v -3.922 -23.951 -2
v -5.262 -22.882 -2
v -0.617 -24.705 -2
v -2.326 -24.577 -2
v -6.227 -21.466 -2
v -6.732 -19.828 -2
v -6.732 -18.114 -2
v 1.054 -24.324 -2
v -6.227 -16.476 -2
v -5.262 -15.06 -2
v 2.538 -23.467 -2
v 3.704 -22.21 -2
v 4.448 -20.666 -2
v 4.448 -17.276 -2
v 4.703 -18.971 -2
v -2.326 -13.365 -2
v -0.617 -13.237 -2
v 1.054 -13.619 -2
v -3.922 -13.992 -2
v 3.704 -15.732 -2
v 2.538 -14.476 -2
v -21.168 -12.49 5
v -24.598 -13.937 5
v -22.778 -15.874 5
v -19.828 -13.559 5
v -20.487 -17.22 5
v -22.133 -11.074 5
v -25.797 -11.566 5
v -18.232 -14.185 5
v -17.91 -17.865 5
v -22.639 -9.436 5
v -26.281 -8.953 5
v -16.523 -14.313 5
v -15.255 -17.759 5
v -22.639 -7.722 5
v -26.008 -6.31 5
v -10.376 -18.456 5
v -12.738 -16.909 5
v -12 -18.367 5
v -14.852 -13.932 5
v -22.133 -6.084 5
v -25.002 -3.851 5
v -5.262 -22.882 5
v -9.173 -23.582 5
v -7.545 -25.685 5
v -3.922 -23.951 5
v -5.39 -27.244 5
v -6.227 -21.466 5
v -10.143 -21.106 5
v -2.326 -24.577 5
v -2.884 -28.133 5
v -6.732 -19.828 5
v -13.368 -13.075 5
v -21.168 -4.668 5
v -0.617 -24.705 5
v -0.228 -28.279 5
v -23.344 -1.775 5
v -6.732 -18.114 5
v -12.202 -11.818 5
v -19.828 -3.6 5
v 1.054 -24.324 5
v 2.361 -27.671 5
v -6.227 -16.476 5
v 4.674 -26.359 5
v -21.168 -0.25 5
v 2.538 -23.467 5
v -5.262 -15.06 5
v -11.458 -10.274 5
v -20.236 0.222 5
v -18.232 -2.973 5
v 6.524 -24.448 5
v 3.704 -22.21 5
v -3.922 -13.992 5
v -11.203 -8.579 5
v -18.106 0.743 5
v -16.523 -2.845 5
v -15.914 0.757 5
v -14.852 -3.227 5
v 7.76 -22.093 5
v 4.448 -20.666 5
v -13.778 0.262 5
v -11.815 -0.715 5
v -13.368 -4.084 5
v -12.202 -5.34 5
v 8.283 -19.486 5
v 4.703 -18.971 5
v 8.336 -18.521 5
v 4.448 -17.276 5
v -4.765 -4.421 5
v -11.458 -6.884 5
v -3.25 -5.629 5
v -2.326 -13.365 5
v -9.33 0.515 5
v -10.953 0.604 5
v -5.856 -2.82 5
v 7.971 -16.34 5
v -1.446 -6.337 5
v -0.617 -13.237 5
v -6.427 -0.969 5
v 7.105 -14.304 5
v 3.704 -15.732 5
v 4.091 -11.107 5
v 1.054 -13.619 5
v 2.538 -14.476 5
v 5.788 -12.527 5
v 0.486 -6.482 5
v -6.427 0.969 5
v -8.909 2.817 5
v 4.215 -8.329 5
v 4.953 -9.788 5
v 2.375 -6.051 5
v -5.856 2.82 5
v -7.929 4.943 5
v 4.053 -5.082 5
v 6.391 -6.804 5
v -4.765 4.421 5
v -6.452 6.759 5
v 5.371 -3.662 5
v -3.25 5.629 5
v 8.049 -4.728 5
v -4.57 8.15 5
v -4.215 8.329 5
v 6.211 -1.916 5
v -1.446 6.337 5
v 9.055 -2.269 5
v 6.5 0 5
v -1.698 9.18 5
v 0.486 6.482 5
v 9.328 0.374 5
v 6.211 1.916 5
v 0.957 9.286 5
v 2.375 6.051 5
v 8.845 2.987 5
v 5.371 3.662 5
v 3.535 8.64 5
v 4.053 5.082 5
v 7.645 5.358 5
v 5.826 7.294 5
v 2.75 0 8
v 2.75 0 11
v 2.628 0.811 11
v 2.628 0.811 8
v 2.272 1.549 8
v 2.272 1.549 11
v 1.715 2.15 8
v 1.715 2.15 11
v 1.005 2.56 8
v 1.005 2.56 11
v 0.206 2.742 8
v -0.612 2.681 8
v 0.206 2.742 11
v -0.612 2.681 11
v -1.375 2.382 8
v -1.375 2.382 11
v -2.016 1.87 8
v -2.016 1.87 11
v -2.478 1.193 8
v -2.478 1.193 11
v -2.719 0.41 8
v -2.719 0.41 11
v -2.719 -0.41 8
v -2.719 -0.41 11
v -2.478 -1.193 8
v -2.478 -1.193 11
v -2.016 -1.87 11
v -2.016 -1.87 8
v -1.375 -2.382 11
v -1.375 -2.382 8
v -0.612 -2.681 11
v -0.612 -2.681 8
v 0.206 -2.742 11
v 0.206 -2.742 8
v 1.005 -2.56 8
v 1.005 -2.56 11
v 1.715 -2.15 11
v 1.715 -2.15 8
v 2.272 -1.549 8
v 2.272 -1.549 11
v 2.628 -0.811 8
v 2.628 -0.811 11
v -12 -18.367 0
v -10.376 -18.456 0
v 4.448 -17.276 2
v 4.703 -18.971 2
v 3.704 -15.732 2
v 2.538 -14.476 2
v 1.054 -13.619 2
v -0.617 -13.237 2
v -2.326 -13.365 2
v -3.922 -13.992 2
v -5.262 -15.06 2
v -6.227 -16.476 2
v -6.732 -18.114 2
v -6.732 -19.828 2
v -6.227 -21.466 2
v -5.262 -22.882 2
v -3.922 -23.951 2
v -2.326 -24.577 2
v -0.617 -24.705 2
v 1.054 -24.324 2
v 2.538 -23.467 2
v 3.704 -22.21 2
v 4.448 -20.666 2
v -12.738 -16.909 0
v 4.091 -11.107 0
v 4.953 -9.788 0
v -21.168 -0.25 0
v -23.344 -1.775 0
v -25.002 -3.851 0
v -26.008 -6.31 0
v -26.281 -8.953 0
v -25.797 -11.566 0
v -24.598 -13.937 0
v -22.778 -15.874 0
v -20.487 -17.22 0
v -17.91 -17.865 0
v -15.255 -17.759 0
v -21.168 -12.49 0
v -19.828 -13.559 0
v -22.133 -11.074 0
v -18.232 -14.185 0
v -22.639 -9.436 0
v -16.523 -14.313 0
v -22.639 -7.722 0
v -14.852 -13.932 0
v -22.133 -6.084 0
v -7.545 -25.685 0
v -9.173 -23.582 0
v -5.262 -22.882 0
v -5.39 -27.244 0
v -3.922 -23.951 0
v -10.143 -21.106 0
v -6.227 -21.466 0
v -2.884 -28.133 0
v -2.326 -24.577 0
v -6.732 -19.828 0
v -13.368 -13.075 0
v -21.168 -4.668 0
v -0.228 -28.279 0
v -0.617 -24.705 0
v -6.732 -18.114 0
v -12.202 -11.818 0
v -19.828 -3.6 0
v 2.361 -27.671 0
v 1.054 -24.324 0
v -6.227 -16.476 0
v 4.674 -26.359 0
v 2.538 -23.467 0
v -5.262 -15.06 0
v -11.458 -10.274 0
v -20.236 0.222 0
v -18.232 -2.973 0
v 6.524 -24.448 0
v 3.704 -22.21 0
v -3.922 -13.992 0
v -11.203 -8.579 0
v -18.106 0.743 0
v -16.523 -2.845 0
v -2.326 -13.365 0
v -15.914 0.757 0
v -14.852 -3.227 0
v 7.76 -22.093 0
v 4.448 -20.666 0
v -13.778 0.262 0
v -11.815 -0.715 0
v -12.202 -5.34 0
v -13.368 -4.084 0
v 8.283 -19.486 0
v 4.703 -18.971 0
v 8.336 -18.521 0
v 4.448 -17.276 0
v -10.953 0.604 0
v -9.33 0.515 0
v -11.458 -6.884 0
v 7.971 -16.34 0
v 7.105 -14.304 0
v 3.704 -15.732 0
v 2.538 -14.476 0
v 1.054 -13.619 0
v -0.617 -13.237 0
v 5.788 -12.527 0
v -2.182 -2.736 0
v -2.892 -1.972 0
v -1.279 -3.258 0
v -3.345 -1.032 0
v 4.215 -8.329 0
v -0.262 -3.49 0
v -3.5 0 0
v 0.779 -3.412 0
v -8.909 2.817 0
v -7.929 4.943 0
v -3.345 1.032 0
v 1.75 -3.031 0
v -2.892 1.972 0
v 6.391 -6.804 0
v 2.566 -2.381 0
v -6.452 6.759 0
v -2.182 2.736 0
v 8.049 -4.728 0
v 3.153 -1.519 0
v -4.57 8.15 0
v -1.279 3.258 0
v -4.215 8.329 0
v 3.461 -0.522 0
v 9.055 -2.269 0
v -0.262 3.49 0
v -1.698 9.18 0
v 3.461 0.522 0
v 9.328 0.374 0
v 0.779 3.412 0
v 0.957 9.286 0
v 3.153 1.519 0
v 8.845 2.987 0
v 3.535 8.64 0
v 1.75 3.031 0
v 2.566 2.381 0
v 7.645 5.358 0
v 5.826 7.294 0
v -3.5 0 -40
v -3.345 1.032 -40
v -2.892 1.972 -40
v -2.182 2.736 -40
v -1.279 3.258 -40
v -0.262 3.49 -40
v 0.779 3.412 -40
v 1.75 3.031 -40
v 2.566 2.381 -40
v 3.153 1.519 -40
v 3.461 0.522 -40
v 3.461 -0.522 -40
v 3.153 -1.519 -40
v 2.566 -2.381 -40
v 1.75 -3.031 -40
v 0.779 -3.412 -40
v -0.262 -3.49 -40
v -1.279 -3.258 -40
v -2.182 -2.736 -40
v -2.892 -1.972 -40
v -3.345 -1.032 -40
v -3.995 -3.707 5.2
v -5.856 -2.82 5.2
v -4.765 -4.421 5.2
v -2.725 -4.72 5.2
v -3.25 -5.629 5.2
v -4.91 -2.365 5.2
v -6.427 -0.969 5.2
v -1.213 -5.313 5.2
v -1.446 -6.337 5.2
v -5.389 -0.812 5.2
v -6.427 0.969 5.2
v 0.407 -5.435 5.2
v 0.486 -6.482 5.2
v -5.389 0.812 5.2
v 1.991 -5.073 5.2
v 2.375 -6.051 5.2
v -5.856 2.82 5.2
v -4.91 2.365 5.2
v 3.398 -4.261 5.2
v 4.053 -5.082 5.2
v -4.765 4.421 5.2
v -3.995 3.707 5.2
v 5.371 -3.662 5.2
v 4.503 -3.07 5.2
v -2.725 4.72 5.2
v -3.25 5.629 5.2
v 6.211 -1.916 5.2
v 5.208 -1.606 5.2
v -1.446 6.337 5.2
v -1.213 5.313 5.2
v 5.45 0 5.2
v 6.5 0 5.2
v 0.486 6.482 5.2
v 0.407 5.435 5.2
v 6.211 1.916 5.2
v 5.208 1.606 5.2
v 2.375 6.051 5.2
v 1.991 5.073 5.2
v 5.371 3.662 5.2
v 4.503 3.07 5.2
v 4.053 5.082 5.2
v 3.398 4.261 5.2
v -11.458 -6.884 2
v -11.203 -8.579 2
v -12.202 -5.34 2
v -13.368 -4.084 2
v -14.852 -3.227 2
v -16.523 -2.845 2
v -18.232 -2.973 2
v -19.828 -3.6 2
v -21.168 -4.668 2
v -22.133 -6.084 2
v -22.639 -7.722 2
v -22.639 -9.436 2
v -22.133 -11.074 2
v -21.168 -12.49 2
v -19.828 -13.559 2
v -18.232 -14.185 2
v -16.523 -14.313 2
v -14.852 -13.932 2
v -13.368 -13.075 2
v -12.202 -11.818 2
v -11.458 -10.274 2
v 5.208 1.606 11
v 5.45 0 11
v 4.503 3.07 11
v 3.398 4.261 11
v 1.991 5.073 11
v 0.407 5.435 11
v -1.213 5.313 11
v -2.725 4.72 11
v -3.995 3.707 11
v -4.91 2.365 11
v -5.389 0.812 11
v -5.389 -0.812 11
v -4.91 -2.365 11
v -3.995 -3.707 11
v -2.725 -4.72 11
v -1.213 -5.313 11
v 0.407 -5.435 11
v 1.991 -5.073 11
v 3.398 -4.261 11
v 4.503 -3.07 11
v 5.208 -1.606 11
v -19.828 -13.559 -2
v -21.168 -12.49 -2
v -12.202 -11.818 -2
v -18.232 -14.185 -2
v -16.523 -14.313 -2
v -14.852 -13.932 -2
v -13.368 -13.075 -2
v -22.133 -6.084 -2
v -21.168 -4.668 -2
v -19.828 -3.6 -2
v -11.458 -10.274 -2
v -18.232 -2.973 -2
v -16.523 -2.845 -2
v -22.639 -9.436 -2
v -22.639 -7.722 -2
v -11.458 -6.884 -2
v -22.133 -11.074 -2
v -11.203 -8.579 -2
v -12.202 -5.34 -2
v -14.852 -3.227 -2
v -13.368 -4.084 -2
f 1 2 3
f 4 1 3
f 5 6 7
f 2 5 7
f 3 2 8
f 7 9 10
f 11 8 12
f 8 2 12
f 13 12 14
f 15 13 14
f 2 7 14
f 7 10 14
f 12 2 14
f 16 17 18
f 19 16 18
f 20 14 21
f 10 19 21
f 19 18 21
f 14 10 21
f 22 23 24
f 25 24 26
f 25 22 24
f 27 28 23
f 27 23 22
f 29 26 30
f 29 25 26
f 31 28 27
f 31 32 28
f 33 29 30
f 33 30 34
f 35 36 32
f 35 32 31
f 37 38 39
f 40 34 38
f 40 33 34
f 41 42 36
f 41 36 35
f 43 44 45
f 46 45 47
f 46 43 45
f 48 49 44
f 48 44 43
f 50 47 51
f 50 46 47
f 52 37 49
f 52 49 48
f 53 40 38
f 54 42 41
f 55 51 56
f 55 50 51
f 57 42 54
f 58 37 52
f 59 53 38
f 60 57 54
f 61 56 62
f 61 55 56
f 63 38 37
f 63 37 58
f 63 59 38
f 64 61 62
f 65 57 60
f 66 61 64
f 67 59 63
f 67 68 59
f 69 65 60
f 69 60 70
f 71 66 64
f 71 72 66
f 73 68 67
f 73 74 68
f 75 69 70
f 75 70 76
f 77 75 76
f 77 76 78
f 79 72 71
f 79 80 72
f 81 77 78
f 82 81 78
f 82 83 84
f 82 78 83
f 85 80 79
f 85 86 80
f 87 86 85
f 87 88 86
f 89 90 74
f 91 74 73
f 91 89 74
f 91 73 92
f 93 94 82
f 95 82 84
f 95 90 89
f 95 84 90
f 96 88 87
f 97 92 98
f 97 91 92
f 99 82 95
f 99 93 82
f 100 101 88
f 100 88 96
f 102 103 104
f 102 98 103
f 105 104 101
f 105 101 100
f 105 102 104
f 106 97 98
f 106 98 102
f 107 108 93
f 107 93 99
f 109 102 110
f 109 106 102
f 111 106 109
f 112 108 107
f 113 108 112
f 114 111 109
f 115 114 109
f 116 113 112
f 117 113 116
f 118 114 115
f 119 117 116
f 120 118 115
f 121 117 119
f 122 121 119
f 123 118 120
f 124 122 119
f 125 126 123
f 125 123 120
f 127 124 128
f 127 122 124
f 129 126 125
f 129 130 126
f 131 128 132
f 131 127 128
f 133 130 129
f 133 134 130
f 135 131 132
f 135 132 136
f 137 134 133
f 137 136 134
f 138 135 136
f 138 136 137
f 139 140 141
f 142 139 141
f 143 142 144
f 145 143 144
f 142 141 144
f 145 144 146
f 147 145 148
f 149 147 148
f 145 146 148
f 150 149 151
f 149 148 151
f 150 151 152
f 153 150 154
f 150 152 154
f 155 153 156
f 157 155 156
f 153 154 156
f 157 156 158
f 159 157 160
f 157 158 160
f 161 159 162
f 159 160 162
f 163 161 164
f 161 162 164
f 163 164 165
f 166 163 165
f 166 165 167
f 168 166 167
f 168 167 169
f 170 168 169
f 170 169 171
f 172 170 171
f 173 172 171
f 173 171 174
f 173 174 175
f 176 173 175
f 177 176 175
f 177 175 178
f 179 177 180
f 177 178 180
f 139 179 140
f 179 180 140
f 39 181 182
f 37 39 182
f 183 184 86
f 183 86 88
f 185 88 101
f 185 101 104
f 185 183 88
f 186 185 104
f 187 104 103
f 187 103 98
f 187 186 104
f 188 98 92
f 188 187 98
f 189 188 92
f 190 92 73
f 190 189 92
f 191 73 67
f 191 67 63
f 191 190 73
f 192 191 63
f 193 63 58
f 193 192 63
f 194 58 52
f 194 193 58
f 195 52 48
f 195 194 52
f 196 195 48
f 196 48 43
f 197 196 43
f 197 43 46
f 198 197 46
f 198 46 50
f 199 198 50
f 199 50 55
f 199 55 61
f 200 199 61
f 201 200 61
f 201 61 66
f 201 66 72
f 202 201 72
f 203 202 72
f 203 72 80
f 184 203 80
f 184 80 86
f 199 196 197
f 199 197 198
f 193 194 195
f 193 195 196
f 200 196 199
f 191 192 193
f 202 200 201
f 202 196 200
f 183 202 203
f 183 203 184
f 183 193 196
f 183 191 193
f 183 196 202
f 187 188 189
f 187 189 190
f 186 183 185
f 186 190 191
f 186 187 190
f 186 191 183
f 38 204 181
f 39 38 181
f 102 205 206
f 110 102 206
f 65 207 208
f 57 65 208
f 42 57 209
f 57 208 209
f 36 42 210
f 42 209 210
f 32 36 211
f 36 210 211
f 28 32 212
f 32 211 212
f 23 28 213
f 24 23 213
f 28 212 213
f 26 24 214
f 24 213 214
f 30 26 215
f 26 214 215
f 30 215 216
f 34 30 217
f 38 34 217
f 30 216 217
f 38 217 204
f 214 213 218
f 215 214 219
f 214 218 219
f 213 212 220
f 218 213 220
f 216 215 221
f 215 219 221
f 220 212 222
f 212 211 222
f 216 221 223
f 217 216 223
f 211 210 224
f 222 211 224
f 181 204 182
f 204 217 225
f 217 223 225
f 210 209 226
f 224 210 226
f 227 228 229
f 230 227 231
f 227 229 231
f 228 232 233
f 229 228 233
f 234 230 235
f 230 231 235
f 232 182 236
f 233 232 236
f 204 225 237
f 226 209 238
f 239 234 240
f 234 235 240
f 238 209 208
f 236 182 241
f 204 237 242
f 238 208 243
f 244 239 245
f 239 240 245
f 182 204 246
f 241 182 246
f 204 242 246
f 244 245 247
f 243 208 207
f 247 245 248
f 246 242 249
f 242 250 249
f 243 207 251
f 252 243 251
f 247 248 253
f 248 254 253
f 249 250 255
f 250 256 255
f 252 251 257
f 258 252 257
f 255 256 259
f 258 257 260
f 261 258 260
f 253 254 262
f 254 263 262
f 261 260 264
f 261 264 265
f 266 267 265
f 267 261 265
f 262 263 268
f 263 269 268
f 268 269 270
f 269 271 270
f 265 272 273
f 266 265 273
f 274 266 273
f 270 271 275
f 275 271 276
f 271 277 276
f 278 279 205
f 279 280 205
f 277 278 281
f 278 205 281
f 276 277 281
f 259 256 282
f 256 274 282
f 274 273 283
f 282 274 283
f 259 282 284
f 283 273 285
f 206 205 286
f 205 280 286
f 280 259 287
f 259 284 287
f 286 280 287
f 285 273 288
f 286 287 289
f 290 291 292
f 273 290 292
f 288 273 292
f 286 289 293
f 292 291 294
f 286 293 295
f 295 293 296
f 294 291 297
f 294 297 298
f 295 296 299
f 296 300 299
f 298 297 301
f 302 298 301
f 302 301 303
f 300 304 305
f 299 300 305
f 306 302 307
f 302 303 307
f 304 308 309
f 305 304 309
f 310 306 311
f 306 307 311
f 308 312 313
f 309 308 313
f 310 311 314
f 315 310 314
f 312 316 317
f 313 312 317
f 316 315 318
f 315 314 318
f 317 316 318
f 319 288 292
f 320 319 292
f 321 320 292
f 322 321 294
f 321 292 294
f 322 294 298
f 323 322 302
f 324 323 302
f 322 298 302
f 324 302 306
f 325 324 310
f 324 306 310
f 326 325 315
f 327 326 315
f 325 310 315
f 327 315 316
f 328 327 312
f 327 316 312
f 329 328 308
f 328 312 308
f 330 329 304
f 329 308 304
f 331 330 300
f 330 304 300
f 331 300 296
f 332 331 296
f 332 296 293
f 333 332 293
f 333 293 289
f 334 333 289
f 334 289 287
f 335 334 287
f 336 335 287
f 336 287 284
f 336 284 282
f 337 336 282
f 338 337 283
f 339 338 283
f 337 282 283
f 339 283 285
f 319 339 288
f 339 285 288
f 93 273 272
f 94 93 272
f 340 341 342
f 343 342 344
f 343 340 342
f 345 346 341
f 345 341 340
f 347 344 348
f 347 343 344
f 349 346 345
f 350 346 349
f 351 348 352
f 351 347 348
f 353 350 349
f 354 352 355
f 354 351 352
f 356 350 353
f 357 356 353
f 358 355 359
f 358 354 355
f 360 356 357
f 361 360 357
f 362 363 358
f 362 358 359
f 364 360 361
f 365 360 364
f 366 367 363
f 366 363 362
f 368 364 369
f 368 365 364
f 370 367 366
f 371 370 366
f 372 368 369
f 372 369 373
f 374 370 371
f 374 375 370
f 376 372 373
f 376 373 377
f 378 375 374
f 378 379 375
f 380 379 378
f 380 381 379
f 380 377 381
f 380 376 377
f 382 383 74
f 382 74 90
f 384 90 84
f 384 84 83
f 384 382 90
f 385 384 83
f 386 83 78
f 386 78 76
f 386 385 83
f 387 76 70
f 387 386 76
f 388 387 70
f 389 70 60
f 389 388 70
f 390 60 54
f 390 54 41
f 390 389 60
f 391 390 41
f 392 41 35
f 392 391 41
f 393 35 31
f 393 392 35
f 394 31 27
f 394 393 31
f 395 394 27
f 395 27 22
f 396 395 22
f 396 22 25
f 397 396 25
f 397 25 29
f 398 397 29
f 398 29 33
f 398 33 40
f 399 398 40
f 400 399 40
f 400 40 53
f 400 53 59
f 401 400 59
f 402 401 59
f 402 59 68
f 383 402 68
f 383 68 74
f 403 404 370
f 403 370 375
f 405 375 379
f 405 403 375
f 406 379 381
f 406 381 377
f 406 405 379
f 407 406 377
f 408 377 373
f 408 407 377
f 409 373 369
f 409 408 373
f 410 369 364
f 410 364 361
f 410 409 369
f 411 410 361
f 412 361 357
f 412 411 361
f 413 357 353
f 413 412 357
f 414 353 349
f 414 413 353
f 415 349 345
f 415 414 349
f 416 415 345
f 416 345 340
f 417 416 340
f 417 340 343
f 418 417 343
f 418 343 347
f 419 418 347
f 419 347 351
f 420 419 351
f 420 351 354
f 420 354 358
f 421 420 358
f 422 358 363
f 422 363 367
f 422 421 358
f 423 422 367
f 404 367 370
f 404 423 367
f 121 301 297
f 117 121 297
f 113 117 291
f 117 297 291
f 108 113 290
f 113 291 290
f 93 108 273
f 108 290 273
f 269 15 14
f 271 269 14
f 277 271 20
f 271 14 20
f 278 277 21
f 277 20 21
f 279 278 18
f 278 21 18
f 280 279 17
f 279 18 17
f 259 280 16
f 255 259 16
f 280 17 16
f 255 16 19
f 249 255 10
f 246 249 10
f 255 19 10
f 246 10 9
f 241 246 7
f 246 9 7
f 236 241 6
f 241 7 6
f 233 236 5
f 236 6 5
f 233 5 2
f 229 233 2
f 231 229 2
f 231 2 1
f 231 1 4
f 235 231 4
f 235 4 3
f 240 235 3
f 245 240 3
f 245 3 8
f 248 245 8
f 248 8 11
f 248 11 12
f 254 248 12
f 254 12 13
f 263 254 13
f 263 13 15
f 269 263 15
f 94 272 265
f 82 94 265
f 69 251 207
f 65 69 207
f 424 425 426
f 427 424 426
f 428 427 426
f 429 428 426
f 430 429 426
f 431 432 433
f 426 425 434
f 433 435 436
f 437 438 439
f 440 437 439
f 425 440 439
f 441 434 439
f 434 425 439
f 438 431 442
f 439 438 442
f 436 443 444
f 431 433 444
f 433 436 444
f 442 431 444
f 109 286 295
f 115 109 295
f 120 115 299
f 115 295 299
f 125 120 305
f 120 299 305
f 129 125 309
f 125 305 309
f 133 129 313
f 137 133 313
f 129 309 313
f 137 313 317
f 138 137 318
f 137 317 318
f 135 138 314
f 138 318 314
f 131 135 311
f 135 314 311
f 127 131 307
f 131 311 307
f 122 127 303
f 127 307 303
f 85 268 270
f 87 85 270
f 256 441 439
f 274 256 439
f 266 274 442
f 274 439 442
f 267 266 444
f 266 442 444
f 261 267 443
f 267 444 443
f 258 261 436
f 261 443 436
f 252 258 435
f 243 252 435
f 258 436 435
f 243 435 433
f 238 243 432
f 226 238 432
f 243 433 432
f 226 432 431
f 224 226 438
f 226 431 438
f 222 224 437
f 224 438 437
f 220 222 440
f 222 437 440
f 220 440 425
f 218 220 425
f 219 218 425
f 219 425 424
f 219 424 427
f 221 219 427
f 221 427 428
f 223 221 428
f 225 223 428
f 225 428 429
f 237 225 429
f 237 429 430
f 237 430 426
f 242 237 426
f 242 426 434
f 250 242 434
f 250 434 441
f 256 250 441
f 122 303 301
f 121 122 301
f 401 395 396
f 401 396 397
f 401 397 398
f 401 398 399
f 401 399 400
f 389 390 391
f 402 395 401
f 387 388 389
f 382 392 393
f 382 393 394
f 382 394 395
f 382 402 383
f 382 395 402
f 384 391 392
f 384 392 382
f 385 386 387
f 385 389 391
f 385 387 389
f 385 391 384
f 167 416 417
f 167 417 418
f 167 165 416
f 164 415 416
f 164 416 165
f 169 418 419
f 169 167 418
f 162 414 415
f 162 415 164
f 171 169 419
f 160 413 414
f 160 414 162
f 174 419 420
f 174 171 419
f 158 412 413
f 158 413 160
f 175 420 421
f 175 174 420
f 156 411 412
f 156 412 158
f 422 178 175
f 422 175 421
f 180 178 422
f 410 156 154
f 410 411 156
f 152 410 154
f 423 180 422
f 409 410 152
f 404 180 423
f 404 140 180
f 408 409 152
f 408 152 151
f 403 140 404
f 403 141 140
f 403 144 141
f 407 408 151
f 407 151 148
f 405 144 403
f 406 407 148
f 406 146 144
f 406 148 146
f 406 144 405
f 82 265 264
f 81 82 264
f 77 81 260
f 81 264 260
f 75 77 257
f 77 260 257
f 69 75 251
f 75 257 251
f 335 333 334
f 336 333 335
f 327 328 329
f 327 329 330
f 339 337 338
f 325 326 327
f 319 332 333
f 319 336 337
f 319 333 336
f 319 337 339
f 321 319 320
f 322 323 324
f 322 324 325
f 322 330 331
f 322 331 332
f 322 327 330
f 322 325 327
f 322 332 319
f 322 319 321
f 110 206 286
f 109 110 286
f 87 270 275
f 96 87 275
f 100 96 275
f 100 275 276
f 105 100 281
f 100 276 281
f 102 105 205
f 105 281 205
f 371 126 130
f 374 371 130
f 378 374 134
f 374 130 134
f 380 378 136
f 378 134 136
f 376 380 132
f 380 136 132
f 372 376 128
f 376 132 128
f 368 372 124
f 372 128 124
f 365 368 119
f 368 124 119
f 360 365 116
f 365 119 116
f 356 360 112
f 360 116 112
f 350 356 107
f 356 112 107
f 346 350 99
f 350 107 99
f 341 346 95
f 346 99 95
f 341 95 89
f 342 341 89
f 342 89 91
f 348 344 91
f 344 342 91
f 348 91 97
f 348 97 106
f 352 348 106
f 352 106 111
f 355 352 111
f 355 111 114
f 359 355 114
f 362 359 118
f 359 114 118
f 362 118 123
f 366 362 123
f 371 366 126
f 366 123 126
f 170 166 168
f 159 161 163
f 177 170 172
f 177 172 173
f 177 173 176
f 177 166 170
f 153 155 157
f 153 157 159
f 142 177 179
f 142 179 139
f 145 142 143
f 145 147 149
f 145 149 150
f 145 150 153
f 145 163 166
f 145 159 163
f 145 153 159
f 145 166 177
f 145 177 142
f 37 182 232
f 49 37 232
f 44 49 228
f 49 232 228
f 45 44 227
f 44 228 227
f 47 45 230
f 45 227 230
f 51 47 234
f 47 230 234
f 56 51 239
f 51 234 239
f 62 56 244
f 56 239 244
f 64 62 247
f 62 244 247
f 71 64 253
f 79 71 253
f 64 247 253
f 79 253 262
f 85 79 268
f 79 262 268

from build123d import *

# Parameters (mm, degrees)
SKETCH1_R           = 6.5
BOSS_EXTRUDE1_DEPTH = 11
SKETCH2_R           = 2.75
CUT_EXTRUDE1_DEPTH  = 3
SKETCH3_OUTSIDE_W   = 19.284
SKETCH3_OUTSIDE_H   = 19.284
SKETCH3_OUTSIDE_R   = 5.45
CUT_EXTRUDE2_DEPTH  = 5.8
SKETCH4_R           = 3.5
BOSS_EXTRUDE2_DEPTH = 40
JOIN2_OUTLINE_R     = 5.75
JOIN2_OUTLINE_R_2   = 6.5
JOIN2_DEPTH         = 5
JOIN2_START         = -2
JOIN2_2_OUTLINE_R   = 5.75
JOIN2_2_DEPTH       = 4


# Read off the part's stored shape, not the designer's step: Join2
with BuildPart() as part:
    # Sketch1 → Boss-Extrude1 (new body)
    with BuildSketch(Plane.XY):
        Circle(SKETCH1_R)
    extrude(amount=BOSS_EXTRUDE1_DEPTH)

    # Sketch2 → Cut-Extrude1 (cut)
    with BuildSketch(Plane.XY.offset(11)):
        Circle(SKETCH2_R)
    extrude(amount=-CUT_EXTRUDE1_DEPTH, mode=Mode.SUBTRACT)

    # Sketch3 outside → Cut-Extrude2 (cut)
    with BuildSketch(Plane.XY.offset(11)):
        Rectangle(SKETCH3_OUTSIDE_W, SKETCH3_OUTSIDE_H)
        Circle(SKETCH3_OUTSIDE_R, mode=Mode.SUBTRACT)
    extrude(amount=-CUT_EXTRUDE2_DEPTH, mode=Mode.SUBTRACT)

    # Sketch4 → Boss-Extrude2 (add)
    with BuildSketch(Plane(origin=(0, 0, 0), x_dir=(-1, 0, 0), z_dir=(0, 0, -1))):
        Circle(SKETCH4_R)
    extrude(amount=BOSS_EXTRUDE2_DEPTH)

    # Join2 outline → Join2 (add)
    with BuildSketch(Plane.XY):
        with BuildLine():
            Line((4.091169505, -11.107165908), (4.953212207, -9.78769749))
            Line((4.953212207, -9.78769749), (4.215242705, -8.329447379))
            ThreePointArc((4.215242705, -8.329447379), (8.329447379, 4.215242705), (-4.215242705, 8.329447379))
            Line((-4.215242705, 8.329447379), (-4.56983635, 8.149999907))
            ThreePointArc((-4.56983635, 8.149999907), (-7.929245952, 4.942970907), (-9.329576894, 0.51468217))
            Line((-9.329576894, 0.51468217), (-10.953000775, 0.604241143))
            Line((-10.953000775, 0.604241143), (-11.815043478, -0.715227275))
            ThreePointArc((-11.815043478, -0.715227275), (-15.913949613, 0.756712749), (-20.236162848, 0.221818664))
            Line((-20.236162848, 0.221818664), (-21.168032047, -0.249767825))
            ThreePointArc((-21.168032047, -0.249767825), (-25.282236722, -12.794457909), (-12.737546638, -16.908662583))
            Line((-12.737546638, -16.908662583), (-11.999577135, -18.366912694))
            Line((-11.999577135, -18.366912694), (-10.376153254, -18.456471667))
            ThreePointArc((-10.376153254, -18.456471667), (-1.56125853, -28.300730731), (8.283000534, -19.485836007))
            Line((8.283000534, -19.485836007), (8.336201554, -18.521468017))
            ThreePointArc((8.336201554, -18.521468017), (7.105378721, -14.303781228), (4.091169505, -11.107165908))
        make_face()
        with Locations((-1.04657636, -18.971153837)):
            Circle(JOIN2_OUTLINE_R, mode=Mode.SUBTRACT)
        with Locations((-16.952789342, -8.579215204)):
            Circle(JOIN2_OUTLINE_R, mode=Mode.SUBTRACT)
        Circle(JOIN2_OUTLINE_R_2, mode=Mode.SUBTRACT)
    extrude(amount=JOIN2_DEPTH)

    # Join2 2 outline → Join2 2 (add)
    with BuildSketch(Plane.XY.offset(JOIN2_START)):
        with Locations((-1.04657636, -18.971153837)):
            Circle(JOIN2_2_OUTLINE_R)
        with Locations((-16.952789342, -8.579215204)):
            Circle(JOIN2_2_OUTLINE_R)
    extrude(amount=JOIN2_2_DEPTH)


solid = part.part
